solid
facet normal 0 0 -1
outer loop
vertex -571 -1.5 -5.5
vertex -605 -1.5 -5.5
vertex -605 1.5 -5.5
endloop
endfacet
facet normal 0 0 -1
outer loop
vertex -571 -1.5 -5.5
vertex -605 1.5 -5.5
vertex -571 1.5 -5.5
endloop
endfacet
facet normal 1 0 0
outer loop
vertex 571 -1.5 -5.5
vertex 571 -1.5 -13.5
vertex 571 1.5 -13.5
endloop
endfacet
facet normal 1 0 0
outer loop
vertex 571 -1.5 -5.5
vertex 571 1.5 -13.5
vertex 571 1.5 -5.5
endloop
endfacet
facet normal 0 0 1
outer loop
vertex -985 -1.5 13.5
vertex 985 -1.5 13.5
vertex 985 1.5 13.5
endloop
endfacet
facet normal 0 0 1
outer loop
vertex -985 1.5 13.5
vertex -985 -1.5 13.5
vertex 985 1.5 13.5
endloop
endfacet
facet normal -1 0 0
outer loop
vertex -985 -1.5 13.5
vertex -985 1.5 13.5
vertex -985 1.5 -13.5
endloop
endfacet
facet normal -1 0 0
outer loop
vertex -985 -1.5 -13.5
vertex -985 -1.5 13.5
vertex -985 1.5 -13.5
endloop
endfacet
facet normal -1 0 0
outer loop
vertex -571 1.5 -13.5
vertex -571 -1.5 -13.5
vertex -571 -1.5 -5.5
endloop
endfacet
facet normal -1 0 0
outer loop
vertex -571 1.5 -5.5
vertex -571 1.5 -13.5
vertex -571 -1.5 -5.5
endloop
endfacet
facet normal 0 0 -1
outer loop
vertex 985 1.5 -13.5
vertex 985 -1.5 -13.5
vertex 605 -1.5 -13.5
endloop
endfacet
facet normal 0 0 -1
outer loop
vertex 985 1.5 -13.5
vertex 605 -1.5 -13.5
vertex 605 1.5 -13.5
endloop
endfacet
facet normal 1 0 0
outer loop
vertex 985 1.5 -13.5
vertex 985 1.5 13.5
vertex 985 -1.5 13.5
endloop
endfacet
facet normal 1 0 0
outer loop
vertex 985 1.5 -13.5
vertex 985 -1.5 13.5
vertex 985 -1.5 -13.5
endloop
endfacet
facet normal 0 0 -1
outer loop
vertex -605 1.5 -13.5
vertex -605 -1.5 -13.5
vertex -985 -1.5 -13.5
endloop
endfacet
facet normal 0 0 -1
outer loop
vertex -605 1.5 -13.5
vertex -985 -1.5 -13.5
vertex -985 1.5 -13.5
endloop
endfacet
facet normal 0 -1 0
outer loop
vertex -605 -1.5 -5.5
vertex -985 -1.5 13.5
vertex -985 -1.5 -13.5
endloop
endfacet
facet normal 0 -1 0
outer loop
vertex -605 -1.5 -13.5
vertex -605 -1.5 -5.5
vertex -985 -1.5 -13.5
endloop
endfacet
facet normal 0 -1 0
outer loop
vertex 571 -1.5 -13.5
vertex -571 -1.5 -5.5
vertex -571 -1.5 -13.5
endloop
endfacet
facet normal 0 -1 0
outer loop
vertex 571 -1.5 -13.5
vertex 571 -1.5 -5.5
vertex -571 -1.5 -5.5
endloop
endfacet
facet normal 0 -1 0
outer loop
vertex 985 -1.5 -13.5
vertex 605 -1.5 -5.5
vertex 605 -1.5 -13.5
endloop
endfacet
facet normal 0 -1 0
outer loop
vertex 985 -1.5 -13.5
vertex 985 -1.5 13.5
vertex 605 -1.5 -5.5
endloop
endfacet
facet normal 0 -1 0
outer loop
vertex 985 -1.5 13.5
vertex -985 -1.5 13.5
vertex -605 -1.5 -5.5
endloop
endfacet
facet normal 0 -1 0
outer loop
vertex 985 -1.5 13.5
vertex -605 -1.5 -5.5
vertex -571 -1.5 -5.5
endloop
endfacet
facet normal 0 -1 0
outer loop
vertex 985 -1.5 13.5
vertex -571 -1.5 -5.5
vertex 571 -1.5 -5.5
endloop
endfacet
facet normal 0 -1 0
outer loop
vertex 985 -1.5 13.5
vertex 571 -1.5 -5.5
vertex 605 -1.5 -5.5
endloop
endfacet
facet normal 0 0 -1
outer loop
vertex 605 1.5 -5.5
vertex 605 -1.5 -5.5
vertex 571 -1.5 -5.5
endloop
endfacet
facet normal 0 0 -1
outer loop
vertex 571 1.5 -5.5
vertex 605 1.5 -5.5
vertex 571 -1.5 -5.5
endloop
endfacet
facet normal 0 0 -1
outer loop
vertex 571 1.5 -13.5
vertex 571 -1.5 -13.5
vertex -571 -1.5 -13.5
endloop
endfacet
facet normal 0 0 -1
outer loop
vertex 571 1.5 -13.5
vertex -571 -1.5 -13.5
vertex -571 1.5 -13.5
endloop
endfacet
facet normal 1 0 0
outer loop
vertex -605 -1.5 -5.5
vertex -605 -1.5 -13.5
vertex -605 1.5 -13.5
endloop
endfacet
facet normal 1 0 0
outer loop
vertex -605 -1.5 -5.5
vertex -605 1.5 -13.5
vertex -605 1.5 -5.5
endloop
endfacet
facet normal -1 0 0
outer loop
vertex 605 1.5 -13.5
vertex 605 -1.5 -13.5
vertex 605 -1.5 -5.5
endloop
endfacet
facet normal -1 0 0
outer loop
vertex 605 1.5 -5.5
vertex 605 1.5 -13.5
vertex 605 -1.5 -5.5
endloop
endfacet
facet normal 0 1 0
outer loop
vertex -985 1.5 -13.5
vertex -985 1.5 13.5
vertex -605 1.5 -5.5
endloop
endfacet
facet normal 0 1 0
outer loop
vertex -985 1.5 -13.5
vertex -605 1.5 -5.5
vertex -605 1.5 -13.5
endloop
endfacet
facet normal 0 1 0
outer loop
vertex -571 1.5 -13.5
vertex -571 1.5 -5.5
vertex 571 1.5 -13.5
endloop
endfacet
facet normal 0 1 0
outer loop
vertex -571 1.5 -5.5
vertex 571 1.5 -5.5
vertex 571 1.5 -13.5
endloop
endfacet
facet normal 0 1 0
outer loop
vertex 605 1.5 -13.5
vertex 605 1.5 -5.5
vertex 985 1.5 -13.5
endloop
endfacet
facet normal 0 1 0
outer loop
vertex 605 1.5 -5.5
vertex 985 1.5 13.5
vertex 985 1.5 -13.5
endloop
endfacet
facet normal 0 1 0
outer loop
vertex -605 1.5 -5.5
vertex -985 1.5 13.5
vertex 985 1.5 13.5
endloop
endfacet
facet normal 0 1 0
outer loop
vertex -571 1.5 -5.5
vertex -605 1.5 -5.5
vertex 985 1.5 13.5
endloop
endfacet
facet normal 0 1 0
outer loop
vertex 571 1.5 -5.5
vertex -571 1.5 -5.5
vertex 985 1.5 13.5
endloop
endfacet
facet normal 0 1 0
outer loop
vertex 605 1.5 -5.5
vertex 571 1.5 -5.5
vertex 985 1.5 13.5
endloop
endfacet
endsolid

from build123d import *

# Parameters (mm, degrees)
SKETCH_1_W          = 27
SKETCH_1_H          = 3
EXTRUDE_1_DEPTH     = 985
CUT_EXTRUDE_1_REACH = 987.097
SKETCH_2_W          = 34
SKETCH_2_H          = 22.55300249


with BuildPart() as part:
    # Эскиз1 → Бобышка-Вытянуть1 (new, symmetric)
    with BuildSketch(Plane(origin=(0, 0, 0), x_dir=(0, 0, -1), z_dir=(1, 0, 0))):
        Rectangle(SKETCH_1_W, SKETCH_1_H)
    extrude(amount=EXTRUDE_1_DEPTH, both=True)

    # Эскиз2 → Вырез-Вытянуть1 (cut, up to next)
    with BuildSketch(Plane.XZ.offset(1.5), mode=Mode.PRIVATE) as cut_extrude_1_sk1:
        with Locations((-588, -16.776501245)):
            Rectangle(SKETCH_2_W, SKETCH_2_H)
    cut_extrude_1_tool1 = extrude(cut_extrude_1_sk1.sketch, amount=-CUT_EXTRUDE_1_REACH, mode=Mode.PRIVATE) & part.part
    cut_extrude_1 = cut_extrude_1_tool1.solids().sort_by_distance((-588, -1.5, -16.776501))[0]
    add(cut_extrude_1, mode=Mode.SUBTRACT)

    # Зеркальное отражение1: Вырез-Вытянуть1 across plane
    add(cut_extrude_1.mirror(Plane(origin=(0, 0, 0), x_dir=(0, 0, 1), z_dir=(1, 0, 0))), mode=Mode.SUBTRACT)


solid = part.part
